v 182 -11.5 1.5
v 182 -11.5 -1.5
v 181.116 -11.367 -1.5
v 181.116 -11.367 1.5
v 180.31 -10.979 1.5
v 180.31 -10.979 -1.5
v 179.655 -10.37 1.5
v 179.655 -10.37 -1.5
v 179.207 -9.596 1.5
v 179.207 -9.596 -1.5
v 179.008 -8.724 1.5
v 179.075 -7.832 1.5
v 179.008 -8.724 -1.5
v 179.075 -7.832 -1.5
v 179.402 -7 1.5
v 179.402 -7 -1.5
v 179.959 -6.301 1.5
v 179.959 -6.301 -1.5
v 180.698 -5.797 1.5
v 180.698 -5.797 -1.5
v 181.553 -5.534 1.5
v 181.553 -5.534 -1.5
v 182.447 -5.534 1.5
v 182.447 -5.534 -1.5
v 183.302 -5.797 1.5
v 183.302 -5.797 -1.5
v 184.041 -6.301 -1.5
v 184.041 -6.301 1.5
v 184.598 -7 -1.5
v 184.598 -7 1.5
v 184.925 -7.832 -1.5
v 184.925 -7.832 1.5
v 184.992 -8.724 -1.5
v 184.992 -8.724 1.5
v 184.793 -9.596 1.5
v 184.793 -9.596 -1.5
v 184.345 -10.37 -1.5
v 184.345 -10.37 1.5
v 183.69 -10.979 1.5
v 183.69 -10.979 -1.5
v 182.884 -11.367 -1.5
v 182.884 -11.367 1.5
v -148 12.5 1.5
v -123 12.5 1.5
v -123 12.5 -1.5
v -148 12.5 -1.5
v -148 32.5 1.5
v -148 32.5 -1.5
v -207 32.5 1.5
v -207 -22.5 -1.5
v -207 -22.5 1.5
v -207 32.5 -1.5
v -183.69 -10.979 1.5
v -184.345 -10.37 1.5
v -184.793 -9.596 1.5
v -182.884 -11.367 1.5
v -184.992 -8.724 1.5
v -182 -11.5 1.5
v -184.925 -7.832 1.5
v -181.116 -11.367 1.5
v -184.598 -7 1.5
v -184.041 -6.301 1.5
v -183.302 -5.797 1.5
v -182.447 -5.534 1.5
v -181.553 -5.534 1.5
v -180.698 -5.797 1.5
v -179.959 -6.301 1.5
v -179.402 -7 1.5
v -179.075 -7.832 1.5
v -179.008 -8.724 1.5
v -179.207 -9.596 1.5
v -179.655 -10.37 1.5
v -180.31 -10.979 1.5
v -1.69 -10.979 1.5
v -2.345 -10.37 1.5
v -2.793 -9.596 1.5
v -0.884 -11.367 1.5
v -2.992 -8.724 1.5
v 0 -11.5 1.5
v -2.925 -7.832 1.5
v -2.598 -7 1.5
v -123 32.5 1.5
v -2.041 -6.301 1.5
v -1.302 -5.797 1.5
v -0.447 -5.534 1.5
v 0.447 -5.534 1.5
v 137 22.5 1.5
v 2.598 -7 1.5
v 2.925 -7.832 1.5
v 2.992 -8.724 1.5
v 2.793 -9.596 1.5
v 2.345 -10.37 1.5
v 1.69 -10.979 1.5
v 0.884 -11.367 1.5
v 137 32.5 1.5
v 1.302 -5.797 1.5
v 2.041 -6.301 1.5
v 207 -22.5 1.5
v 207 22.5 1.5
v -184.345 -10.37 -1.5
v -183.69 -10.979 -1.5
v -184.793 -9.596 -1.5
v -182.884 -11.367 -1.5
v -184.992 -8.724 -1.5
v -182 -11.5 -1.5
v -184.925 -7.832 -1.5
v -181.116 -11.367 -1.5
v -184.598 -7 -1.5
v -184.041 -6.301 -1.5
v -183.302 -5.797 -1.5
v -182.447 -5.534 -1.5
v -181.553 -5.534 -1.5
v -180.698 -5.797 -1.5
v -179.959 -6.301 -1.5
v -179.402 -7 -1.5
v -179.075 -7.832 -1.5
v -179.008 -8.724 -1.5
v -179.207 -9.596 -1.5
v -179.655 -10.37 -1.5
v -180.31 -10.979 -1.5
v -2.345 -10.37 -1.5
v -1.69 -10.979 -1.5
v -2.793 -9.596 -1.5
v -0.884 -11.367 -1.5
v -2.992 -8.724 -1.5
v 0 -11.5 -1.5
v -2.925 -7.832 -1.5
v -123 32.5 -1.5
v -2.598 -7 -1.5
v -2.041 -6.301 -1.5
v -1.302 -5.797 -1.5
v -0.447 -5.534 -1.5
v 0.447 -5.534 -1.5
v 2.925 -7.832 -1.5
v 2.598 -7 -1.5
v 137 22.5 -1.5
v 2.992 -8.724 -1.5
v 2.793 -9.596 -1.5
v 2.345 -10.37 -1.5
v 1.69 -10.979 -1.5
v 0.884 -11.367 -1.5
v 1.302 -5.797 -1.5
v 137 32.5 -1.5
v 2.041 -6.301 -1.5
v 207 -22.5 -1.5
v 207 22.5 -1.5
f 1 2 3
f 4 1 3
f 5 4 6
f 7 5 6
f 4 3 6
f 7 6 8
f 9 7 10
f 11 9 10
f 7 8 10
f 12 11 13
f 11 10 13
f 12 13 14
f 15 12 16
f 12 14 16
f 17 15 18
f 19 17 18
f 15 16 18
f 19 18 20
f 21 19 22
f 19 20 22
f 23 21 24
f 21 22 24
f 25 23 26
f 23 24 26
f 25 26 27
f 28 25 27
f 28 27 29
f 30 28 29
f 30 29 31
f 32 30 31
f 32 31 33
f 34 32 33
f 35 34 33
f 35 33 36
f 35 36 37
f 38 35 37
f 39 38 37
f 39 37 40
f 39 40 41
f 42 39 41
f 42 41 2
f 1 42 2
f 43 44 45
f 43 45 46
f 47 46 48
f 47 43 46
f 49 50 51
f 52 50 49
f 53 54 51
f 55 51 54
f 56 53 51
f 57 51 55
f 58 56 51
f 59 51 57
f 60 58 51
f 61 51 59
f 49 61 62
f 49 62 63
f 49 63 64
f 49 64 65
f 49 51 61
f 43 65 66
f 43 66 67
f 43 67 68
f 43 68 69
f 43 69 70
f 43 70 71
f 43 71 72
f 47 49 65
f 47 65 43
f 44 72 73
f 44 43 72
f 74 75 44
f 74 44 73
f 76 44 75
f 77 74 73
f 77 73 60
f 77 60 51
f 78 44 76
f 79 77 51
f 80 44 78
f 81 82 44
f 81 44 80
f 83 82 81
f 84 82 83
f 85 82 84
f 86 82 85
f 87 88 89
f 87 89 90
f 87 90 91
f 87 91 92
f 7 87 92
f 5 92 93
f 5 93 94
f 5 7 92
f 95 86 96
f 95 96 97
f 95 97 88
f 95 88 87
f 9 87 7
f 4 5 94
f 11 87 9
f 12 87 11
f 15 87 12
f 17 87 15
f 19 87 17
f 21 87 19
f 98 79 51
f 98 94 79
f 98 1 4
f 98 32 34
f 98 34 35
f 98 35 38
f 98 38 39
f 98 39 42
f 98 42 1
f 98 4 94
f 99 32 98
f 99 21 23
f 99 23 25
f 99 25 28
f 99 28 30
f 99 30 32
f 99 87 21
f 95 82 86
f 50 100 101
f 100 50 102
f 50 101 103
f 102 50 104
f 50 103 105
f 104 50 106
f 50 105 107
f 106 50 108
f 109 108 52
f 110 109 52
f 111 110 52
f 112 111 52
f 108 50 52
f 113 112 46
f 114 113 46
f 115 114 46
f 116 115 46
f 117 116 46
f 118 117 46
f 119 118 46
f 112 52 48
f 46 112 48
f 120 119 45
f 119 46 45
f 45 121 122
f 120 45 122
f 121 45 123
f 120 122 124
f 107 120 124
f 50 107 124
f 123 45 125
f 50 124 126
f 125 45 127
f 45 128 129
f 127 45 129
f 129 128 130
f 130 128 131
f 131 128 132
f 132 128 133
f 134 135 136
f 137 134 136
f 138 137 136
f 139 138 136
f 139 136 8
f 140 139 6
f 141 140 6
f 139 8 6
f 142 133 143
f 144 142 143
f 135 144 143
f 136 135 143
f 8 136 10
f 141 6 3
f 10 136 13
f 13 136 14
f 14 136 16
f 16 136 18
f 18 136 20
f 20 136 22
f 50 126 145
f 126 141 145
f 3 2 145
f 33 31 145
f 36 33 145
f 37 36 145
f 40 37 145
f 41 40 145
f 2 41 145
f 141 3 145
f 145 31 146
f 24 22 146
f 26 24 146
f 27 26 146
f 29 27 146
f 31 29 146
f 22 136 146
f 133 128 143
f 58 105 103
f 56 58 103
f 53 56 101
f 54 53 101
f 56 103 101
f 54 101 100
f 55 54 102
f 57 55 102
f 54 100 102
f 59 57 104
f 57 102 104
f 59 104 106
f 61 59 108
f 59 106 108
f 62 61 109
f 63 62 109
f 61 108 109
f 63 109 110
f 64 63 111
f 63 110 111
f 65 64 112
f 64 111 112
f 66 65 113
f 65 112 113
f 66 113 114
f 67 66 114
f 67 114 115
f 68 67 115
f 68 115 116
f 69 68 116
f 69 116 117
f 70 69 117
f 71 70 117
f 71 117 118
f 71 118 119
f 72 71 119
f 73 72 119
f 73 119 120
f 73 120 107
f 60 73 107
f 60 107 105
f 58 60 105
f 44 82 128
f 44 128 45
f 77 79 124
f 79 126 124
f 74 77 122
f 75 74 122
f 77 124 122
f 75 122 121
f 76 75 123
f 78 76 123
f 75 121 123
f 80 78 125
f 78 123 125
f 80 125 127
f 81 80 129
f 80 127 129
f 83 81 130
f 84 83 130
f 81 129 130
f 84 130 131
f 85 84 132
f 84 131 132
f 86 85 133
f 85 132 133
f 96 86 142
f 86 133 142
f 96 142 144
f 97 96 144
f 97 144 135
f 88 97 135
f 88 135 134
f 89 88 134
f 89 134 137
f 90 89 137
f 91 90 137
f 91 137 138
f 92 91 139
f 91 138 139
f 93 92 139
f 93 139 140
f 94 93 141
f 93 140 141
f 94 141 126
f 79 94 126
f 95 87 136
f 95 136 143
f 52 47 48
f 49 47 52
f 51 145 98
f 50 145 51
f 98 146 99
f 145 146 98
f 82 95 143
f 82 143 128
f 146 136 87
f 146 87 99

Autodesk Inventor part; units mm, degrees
ref_plane "YZ Plane" through (0, 0, 0) normal (1, 0, 0) x (0, 1, 0)
ref_plane "XZ Plane" through (0, 0, 0) normal (0, 1, 0) x (-1, 0, 0)
ref_plane "XY Plane" through (0, 0, 0) normal (0, 0, 1) x (1, 0, 0)
sketch "Sketch1" plane through (0, 0, 0) normal (0, 0, 1) x (1, 0, 0)
  line L0 (-207, 22.5) -> (207, 22.5)
  line L1 (207, 22.5) -> (207, -22.5)
  line L2 (207, -22.5) -> (-207, -22.5)
  line L3 (-207, -22.5) -> (-207, 22.5)
  line L4 (-207, 22.5) -> (207, -22.5) construction
  line L5 (207, 22.5) -> (-207, -22.5) construction
  point P0 (0, 0)
  dimension "d0" = 414
  dimension "d1" = 45
extrude "Extrusion1" add sketch "Sketch1" along normal mid plane 3
sketch "Sketch2" plane through (0, 0, 1.5) normal (0, 0, 1) x (1, 0, 0)
  line L0 (-207, 22.5) -> (-207, -22.5) projected
  line L1 (207, -22.5) -> (207, 22.5) projected
  line L2 (-207, -22.5) -> (207, -22.5) projected
  point P0 (0, 0)
  point P1 (-182, -8.5)
  point P2 (0, -8.5)
  point P3 (182, -8.5)
  dimension "d4" = 25
  dimension "d5" = 25
  dimension "d6" = 182
  dimension "d7" = 14
hole "Hole1" at (-182, -8.5, 1.5) at (0, -8.5, 1.5) at (182, -8.5, 1.5) direction (0, 0, -1) diameter 6 depth 14.2 tip angle 118
sketch "Sketch3" plane through (0, 0, 1.5) normal (0, 0, 1) x (1, 0, 0)
  line L0 (-207, 22.5) -> (207, 22.5) projected
  line L1 (-148, 22.5) -> (-123, 22.5)
  line L2 (-123, 22.5) -> (-123, 12.5)
  line L3 (-123, 12.5) -> (-148, 12.5)
  line L4 (-148, 12.5) -> (-148, 22.5)
  line L5 (207, -22.5) -> (207, 22.5) projected
  point P0 (0, 0)
  point P1 (-123, 22.5)
  dimension "d15" = 330
  dimension "d16" = 25
  dimension "d17" = 10
extrude "Extrusion2" cut sketch "Sketch3" against normal blind 3
sketch "Sketch5" plane through (0, 0, 1.5) normal (0, 0, 1) x (1, 0, 0)
  line L0 (-148, 22.5) -> (-207, 22.5) projected
  line L1 (-207, 22.5) -> (137, 22.5)
  line L2 (137, 22.5) -> (137, 32.5)
  line L3 (137, 32.5) -> (-207, 32.5)
  line L4 (-207, 32.5) -> (-207, 22.5)
  line L5 (207, -22.5) -> (207, 22.5) projected
  line L6 (-148, 22.5) -> (-148, 32.5)
  line L7 (-123, 22.5) -> (207, 22.5) projected
  line L8 (-123, 22.5) -> (-123, 32.5)
  point P0 (0, 0)
  dimension "d23" = 70
  dimension "d24" = 10
extrude "Extrusion4" add sketch "Sketch5" against normal blind 3 contours L0 L4 L3 L6 | L8 L3 L2 L1
equation "\"d5\" = d4"
properties part number "HCMUTE-CDT23-KXL_A01" material "PMMA Plastic"
